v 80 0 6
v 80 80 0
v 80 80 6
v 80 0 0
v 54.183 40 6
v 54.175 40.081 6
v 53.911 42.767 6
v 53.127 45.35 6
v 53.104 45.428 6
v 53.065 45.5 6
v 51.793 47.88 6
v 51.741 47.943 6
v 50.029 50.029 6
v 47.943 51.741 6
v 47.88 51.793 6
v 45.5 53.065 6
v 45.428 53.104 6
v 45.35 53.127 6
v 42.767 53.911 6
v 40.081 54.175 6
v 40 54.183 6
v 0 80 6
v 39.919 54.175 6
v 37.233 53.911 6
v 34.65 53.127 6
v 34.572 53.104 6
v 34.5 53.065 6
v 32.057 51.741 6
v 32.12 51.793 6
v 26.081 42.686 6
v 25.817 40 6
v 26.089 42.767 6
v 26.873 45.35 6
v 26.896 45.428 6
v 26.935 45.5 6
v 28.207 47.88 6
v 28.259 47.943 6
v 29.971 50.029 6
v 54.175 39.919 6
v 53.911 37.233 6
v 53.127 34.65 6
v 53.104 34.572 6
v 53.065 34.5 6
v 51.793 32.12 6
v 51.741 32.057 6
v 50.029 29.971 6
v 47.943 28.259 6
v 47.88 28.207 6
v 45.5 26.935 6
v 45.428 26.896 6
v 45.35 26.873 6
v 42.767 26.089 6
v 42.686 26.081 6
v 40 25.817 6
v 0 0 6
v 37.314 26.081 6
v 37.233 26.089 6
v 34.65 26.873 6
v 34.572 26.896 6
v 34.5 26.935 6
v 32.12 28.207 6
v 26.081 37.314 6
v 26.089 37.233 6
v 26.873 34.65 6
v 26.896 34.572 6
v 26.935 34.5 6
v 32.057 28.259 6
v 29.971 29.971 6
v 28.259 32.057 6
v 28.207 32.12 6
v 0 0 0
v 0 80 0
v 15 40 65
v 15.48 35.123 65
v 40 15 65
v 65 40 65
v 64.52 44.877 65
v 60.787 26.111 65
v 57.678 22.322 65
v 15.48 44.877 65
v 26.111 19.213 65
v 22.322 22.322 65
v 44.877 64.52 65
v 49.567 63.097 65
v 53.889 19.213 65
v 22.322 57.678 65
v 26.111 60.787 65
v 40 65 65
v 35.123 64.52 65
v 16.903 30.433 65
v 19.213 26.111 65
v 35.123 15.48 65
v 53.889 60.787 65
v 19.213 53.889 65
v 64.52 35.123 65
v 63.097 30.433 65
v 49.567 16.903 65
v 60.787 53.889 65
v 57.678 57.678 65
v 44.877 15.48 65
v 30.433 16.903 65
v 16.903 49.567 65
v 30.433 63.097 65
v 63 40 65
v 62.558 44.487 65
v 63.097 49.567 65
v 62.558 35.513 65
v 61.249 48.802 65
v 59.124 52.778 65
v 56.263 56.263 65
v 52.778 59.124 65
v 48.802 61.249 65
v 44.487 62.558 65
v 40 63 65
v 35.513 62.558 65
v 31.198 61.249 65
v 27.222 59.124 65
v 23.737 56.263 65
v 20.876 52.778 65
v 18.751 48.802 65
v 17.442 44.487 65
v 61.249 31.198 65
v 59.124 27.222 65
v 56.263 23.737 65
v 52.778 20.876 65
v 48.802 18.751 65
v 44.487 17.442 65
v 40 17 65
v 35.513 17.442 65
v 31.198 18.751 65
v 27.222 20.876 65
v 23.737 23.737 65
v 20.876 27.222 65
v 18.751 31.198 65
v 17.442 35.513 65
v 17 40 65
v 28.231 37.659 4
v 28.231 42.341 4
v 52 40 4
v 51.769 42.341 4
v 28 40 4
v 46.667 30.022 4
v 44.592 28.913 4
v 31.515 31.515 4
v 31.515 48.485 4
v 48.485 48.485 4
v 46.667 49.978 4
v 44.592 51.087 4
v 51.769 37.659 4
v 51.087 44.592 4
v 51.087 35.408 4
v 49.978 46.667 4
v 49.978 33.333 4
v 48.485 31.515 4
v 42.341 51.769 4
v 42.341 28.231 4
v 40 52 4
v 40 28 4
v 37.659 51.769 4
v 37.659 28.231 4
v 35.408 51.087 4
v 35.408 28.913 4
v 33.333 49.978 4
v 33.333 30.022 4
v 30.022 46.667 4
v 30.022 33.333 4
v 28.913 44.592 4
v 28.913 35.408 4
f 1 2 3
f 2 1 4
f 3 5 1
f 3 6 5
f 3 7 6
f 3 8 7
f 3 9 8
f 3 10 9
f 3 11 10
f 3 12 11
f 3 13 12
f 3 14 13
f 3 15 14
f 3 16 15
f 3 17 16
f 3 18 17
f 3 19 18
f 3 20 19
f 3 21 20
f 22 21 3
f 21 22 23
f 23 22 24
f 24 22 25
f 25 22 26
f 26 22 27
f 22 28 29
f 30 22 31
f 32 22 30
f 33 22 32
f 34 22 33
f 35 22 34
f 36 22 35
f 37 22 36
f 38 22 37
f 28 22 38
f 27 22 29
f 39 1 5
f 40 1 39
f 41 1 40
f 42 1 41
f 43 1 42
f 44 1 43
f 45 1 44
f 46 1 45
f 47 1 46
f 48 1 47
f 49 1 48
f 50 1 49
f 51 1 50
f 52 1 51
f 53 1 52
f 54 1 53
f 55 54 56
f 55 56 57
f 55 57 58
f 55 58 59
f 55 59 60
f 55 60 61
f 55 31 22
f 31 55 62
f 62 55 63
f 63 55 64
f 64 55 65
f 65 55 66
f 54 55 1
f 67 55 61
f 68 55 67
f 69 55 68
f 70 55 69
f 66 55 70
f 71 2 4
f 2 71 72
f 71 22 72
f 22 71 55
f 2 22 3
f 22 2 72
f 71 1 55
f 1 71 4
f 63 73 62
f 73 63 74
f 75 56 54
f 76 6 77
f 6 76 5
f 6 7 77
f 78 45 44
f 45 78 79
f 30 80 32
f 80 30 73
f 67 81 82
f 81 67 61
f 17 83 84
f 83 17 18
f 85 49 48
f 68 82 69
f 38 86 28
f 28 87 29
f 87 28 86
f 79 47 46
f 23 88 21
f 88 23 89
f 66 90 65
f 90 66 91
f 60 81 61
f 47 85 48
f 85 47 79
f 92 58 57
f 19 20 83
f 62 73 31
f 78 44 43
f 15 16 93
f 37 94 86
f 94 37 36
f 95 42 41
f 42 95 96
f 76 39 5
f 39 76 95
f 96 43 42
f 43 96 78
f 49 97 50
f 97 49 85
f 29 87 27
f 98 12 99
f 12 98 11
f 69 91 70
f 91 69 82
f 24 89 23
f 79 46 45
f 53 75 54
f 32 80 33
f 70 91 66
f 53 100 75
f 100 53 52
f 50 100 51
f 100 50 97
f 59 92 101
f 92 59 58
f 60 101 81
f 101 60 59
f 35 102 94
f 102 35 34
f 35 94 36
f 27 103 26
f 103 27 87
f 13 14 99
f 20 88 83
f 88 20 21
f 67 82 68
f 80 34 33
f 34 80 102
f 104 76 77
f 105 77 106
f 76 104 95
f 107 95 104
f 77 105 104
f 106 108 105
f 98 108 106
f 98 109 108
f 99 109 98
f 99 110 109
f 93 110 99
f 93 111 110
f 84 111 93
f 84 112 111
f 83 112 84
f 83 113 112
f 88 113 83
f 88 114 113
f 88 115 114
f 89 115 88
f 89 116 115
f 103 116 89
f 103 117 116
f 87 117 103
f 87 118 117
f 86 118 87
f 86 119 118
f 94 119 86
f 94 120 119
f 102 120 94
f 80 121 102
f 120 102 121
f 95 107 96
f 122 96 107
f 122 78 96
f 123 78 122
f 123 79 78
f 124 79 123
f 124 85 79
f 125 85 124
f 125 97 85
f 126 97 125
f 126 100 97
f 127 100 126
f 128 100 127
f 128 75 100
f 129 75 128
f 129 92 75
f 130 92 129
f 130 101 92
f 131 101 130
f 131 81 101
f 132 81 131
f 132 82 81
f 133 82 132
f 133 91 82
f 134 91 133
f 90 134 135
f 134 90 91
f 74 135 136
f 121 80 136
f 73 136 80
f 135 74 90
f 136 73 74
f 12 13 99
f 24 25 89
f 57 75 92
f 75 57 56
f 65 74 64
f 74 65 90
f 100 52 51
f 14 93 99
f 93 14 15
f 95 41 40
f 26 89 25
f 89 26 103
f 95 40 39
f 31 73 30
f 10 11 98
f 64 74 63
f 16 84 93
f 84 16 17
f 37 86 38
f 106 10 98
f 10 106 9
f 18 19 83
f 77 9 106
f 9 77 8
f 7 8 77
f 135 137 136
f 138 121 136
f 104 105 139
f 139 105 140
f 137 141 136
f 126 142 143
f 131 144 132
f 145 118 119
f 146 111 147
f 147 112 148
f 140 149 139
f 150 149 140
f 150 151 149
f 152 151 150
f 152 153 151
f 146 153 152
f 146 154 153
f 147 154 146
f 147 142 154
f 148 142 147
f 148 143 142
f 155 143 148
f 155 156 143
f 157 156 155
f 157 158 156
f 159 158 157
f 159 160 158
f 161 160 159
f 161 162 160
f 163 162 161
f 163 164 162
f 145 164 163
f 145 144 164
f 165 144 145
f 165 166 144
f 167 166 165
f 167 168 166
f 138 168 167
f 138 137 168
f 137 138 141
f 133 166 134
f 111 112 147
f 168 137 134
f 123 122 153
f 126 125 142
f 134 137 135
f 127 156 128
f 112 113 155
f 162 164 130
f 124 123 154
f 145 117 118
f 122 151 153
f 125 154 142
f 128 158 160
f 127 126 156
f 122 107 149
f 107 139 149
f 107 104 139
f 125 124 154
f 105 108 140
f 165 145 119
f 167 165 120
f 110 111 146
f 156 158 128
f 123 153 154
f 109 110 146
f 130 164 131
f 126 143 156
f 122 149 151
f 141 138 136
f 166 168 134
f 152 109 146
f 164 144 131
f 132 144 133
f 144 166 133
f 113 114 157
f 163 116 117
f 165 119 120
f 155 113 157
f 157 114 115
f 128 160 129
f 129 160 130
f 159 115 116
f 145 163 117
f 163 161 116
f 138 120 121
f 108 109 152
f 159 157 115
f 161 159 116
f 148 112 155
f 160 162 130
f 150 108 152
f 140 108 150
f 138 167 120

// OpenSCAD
$fn = 32;

// ----------------------------------------------------------------------
// Hopper: funnel with square flange
// ----------------------------------------------------------------------

// --- parameters (mm) ---
fl = 80;                  // flange side, X and Y
fl_t = 6;                 // flange thickness
cone_h = 60;              // cone height above the flange
top_d = 50;               // cone mouth diameter
bot_d = 28;               // cone spout diameter
wall = 2;                 // cone wall thickness

bore_d = bot_d - 2 * wall;  // spout bore diameter
total_h = fl_t + cone_h - 1;  // overall height

difference() {
  union() {
    cube([fl, fl, fl_t]);
    translate([fl / 2, fl / 2, fl_t - 1])
      cylinder(h = cone_h, d1 = bot_d, d2 = top_d);
  }
  translate([fl / 2, fl / 2, fl_t - 2])
    cylinder(h = cone_h + 1, d1 = bore_d, d2 = top_d - 2 * wall);
}
